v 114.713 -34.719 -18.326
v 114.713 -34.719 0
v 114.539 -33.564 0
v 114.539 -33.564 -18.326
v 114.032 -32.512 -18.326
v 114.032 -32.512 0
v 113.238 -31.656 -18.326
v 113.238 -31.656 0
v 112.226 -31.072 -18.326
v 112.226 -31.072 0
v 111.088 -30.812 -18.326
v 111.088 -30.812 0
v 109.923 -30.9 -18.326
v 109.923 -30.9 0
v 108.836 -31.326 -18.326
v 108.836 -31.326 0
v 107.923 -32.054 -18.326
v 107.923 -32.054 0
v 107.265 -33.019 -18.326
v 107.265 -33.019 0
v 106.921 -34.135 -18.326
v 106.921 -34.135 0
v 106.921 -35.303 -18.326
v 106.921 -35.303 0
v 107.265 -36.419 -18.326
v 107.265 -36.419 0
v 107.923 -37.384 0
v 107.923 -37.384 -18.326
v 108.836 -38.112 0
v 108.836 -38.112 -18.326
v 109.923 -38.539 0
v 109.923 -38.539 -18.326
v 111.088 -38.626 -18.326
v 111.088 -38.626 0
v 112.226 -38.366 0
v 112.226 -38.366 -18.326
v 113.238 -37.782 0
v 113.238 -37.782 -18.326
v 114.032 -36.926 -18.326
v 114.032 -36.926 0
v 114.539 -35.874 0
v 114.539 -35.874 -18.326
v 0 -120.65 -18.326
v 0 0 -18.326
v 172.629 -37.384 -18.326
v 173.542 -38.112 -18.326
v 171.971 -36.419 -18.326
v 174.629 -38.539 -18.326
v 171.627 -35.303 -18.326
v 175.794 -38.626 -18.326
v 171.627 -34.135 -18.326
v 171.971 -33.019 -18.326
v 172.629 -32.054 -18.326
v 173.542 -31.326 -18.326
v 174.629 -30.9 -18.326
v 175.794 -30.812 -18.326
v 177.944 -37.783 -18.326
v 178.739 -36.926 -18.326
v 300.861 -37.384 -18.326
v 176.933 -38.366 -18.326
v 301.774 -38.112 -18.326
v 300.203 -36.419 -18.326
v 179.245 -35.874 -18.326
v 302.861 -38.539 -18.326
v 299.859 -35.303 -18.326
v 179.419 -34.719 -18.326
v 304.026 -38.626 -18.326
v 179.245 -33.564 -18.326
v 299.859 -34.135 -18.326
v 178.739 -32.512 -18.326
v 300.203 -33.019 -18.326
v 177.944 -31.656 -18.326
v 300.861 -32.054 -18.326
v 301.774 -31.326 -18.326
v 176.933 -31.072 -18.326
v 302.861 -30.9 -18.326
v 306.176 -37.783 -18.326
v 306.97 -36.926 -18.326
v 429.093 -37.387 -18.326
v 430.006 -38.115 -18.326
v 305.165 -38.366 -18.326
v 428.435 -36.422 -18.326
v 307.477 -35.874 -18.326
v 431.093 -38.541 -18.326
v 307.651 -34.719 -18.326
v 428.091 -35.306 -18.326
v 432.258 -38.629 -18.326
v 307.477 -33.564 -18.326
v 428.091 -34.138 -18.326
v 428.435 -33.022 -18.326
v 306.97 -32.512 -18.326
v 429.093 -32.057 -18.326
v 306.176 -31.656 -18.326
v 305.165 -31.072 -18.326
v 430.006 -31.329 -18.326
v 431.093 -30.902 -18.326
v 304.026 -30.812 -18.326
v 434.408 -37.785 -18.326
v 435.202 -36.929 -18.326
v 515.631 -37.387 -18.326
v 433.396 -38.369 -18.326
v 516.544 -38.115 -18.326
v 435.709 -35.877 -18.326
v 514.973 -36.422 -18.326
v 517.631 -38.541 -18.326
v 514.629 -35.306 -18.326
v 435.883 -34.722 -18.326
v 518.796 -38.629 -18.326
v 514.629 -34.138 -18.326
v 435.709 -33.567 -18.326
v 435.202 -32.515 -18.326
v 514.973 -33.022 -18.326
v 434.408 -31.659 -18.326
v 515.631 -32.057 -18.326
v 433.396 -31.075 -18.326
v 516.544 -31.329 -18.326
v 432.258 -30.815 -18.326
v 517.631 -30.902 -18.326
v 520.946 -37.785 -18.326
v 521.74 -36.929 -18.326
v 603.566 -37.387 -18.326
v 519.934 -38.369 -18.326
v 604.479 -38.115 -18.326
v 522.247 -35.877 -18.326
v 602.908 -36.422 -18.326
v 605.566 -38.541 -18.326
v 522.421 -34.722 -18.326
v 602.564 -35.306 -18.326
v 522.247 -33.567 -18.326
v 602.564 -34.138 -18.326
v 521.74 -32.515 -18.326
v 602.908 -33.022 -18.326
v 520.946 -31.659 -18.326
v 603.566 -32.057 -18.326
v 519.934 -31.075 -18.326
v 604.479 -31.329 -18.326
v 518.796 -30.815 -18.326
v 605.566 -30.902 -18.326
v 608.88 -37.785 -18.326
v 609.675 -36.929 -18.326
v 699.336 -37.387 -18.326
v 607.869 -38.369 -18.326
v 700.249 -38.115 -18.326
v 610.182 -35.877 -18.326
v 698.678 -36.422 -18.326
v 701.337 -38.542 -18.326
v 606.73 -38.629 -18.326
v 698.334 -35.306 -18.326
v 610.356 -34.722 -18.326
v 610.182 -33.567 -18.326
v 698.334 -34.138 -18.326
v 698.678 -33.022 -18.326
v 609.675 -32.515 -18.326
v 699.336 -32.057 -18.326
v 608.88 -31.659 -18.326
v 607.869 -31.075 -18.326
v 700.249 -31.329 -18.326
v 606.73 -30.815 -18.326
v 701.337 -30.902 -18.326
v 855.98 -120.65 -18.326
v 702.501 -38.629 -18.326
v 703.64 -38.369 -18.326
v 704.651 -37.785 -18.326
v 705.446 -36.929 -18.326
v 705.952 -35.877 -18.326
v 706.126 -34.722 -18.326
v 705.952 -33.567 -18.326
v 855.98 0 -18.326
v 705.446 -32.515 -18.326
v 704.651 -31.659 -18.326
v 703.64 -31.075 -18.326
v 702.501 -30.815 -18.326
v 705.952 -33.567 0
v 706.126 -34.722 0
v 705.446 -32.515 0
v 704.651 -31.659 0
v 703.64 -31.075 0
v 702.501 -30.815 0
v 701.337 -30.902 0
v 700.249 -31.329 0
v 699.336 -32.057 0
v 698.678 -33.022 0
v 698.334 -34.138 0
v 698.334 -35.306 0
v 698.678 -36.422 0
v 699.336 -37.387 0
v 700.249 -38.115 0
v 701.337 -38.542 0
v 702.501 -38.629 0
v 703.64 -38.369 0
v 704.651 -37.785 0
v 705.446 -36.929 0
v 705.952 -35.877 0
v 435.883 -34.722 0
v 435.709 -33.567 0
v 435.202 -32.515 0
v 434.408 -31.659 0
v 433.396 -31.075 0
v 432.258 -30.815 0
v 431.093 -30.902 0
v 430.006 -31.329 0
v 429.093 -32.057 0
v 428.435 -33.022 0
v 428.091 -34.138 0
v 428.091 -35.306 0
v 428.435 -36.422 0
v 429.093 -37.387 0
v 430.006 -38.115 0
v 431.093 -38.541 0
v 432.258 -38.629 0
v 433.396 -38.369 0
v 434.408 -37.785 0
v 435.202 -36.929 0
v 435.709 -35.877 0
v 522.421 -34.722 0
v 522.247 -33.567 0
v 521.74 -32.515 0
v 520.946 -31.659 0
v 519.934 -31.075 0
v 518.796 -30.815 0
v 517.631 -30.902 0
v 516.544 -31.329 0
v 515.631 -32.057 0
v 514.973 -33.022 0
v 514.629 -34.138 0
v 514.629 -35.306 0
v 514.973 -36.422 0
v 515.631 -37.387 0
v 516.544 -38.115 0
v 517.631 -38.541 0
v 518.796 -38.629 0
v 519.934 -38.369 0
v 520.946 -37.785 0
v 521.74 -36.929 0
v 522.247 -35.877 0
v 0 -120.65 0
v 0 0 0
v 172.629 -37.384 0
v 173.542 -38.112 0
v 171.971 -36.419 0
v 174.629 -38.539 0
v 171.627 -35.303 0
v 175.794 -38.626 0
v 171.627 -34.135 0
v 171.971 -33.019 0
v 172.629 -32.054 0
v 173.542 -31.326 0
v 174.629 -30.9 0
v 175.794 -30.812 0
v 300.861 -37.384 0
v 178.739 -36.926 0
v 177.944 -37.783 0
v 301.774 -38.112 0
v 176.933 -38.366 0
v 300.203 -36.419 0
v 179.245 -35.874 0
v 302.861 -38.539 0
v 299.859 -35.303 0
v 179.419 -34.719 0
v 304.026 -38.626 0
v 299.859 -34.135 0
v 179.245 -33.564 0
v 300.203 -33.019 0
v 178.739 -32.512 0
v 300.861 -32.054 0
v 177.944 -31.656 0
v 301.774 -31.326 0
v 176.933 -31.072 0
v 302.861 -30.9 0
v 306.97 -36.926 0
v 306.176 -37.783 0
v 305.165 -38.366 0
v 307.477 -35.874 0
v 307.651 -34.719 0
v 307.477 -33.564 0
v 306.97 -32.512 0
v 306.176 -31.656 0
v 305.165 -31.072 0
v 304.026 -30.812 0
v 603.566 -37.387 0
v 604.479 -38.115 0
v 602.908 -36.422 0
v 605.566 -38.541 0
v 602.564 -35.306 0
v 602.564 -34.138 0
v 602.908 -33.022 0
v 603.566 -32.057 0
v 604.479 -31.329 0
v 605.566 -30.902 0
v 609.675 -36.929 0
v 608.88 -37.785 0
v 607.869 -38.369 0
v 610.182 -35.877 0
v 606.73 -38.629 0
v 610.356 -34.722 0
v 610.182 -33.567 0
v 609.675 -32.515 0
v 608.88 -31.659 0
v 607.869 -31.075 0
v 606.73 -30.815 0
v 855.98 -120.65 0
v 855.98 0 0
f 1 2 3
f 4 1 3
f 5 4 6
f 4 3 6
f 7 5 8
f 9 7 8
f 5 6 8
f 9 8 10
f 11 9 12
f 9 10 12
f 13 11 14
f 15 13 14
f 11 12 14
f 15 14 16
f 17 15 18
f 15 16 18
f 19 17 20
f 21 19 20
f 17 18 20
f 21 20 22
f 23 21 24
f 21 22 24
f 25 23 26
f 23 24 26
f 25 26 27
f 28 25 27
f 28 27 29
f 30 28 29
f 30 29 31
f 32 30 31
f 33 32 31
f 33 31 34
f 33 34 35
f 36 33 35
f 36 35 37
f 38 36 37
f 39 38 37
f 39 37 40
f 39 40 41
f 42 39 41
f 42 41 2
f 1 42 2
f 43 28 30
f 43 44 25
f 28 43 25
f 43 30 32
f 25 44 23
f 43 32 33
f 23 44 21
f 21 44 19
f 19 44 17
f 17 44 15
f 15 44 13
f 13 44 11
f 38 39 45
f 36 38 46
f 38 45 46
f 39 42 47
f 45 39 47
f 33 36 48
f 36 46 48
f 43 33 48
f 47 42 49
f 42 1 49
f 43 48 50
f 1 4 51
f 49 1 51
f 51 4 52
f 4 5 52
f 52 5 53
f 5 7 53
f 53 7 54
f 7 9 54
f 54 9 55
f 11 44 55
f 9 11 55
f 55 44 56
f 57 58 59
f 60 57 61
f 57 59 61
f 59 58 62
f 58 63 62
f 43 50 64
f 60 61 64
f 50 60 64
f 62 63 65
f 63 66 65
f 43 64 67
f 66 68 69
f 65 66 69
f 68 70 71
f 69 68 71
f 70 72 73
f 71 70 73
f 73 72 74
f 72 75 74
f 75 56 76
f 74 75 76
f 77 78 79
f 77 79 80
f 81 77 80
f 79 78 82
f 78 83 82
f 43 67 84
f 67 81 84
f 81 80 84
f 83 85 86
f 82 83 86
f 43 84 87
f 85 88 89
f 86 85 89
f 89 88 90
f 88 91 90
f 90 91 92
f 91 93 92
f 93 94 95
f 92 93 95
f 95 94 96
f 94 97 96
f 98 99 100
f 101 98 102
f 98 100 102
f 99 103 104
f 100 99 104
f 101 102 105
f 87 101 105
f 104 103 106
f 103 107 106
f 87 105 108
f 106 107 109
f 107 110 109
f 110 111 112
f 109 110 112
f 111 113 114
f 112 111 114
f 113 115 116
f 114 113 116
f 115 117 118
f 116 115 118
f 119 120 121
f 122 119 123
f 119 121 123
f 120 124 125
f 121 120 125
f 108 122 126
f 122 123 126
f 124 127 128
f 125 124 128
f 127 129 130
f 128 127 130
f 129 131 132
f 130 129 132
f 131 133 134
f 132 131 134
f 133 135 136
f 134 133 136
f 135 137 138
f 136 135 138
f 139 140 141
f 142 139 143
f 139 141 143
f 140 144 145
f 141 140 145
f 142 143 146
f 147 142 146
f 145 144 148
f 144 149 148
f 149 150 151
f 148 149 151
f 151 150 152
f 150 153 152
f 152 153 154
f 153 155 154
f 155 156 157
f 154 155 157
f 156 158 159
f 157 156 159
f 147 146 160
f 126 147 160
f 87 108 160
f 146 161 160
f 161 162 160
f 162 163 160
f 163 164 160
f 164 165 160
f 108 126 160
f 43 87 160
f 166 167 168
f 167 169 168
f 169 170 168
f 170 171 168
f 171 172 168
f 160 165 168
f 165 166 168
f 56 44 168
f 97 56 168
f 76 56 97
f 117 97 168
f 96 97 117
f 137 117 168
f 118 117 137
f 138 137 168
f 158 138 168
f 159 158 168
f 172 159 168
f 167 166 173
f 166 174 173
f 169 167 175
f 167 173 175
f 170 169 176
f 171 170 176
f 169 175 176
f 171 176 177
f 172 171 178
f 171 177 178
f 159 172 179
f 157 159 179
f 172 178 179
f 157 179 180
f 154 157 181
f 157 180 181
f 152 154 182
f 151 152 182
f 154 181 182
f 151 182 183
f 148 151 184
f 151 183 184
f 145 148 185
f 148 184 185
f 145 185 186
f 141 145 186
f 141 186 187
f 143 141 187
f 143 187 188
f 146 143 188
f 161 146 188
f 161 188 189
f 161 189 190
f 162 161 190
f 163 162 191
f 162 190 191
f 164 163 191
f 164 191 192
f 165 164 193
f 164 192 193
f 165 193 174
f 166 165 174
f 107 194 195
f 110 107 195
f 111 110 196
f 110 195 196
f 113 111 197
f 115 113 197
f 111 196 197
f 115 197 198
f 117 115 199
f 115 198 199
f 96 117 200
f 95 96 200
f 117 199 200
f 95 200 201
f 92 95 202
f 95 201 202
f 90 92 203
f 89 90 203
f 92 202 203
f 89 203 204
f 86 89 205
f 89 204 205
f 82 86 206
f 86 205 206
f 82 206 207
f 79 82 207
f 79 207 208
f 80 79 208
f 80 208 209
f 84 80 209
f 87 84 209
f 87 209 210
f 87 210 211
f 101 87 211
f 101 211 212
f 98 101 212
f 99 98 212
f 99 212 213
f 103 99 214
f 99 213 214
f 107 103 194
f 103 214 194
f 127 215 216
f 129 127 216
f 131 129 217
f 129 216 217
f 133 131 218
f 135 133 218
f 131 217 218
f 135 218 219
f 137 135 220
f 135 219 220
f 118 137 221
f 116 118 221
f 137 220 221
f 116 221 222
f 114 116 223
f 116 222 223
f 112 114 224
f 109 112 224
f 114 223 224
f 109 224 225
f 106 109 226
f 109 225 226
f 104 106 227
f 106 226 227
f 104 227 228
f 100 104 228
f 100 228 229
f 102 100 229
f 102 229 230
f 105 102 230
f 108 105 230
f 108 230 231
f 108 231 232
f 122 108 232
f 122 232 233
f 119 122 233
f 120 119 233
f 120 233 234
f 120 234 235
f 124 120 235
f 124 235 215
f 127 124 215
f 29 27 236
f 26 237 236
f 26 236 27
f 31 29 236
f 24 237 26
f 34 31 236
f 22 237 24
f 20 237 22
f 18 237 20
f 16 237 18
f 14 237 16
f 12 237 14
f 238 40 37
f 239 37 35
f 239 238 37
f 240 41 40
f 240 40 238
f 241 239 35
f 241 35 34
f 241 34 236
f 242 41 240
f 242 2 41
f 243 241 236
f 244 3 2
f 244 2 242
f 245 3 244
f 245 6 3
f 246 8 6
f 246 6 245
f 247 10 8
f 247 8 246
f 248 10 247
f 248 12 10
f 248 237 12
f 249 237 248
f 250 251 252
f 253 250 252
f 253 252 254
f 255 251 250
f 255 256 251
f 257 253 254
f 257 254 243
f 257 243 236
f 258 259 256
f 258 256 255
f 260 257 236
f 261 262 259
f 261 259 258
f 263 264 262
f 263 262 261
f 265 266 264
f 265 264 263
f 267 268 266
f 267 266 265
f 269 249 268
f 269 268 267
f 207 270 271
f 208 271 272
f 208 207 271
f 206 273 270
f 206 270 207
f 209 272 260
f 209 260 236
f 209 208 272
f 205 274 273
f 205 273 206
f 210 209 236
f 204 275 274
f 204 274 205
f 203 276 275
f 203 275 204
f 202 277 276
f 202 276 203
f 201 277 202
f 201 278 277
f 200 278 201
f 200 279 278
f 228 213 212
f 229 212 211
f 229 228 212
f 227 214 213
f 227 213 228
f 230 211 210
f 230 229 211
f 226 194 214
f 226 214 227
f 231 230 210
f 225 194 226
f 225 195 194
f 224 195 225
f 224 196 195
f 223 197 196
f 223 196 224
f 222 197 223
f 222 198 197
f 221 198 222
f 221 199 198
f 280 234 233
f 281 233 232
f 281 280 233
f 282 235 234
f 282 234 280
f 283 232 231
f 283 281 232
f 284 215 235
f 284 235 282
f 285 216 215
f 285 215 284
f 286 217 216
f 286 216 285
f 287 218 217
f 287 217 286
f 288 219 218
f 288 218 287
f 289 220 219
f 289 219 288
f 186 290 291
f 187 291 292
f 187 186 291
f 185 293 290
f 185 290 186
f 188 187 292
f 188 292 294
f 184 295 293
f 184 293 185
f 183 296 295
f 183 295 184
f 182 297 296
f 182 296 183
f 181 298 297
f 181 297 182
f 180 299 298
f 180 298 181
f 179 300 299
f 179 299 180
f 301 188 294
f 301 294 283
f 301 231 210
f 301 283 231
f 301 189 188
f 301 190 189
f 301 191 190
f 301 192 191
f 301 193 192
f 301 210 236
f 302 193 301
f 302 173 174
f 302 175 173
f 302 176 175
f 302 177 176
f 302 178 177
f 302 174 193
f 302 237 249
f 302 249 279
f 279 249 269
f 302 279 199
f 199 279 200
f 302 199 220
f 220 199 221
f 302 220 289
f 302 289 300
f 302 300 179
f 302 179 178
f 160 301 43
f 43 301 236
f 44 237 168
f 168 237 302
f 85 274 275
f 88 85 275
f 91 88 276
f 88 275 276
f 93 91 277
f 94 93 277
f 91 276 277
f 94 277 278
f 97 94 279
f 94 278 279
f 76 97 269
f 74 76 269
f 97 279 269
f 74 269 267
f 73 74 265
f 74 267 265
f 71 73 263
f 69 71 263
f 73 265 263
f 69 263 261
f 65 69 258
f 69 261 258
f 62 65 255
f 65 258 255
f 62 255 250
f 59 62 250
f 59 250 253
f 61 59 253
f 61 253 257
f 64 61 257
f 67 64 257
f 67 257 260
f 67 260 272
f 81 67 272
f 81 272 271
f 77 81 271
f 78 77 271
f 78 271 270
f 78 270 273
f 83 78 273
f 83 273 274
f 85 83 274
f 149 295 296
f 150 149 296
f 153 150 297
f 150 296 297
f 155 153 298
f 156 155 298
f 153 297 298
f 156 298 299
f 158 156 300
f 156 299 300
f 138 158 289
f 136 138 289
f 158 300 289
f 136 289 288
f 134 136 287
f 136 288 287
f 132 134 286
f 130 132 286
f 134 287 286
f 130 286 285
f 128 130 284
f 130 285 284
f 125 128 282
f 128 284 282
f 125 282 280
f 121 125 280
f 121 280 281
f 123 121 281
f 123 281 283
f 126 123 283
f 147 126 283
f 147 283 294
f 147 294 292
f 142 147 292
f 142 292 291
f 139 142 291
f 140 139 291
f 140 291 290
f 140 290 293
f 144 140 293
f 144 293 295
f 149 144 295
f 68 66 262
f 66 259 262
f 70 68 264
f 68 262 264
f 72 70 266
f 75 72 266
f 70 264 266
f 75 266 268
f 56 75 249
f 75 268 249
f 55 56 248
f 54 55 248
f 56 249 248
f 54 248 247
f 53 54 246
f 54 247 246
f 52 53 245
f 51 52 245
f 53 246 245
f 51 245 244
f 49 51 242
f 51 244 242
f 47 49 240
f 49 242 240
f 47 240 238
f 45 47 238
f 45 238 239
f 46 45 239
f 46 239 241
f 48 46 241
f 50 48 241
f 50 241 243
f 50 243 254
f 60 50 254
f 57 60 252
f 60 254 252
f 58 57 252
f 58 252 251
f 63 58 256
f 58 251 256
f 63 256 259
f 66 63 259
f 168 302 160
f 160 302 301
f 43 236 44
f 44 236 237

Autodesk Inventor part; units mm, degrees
ref_plane "YZ Plane" through (0, 0, 0) normal (1, 0, 0) x (0, 1, 0)
ref_plane "XZ Plane" through (0, 0, 0) normal (0, 1, 0) x (-1, 0, 0)
ref_plane "XY Plane" through (0, 0, 0) normal (0, 0, 1) x (1, 0, 0)
sketch "Sketch1" plane through (0, 0, 0) normal (0, 0, 1) x (1, 0, 0)
  point P0 (0, 0)
sketch "Sketch2" plane through (0, 0, 0) normal (0, 0, 1) x (1, 0, 0)
  line L0 (0, 0) -> (855.98, 0)
  line L1 (855.98, 0) -> (855.98, -120.65)
  line L2 (855.98, -120.65) -> (0, -120.65)
  line L3 (0, -120.65) -> (0, 0)
  dimension "d0" = 855.98
  dimension "d1" = 120.65
extrude "Extrusion1" add sketch "Sketch2" against normal blind 18.3261
sketch "Sketch3" plane through (0, 0, 0) normal (0, 0, 1) x (1, 0, 0)
  circle A0 centre (702.2084, -34.7218) radius 3.918
  line L0 (855.98, 0) -> (855.98, -120.65)
  line L1 (855.98, -120.65) -> (0, -120.65)
  circle A1 centre (606.4377, -34.7218) radius 3.9179
  circle A2 centre (518.5029, -34.7218) radius 3.9179
  circle A3 centre (431.9651, -34.7218) radius 3.9179
  circle A4 centre (303.7332, -34.7193) radius 3.918
  circle A5 centre (175.5013, -34.7193) radius 3.918
  circle A6 centre (110.7948, -34.7193) radius 3.9179
  point P0 (0, 0)
  dimension "d4" = 153.7716
  dimension "d5" = 7.8359
  dimension "d6" = 85.9282
  dimension "d7" = 7.8359
  dimension "d8" = 87.9348
  dimension "d9" = 7.8359
  dimension "d10" = 87.9348
  dimension "d11" = 7.8359
  dimension "d12" = 86.5378
  dimension "d13" = 128.2319
  dimension "d14" = 7.8359
  dimension "d15" = 128.2319
  dimension "d16" = 7.8359
  dimension "d18" = 85.9307
  dimension "d19" = 85.9307
  dimension "d20" = 85.9307
  dimension "d21" = 85.9282
  dimension "d22" = 85.9282
  dimension "d23" = 85.9282
extrude "Extrusion2" cut sketch "Sketch3" against normal blind 304.8
properties part number "Bumper Middle"
